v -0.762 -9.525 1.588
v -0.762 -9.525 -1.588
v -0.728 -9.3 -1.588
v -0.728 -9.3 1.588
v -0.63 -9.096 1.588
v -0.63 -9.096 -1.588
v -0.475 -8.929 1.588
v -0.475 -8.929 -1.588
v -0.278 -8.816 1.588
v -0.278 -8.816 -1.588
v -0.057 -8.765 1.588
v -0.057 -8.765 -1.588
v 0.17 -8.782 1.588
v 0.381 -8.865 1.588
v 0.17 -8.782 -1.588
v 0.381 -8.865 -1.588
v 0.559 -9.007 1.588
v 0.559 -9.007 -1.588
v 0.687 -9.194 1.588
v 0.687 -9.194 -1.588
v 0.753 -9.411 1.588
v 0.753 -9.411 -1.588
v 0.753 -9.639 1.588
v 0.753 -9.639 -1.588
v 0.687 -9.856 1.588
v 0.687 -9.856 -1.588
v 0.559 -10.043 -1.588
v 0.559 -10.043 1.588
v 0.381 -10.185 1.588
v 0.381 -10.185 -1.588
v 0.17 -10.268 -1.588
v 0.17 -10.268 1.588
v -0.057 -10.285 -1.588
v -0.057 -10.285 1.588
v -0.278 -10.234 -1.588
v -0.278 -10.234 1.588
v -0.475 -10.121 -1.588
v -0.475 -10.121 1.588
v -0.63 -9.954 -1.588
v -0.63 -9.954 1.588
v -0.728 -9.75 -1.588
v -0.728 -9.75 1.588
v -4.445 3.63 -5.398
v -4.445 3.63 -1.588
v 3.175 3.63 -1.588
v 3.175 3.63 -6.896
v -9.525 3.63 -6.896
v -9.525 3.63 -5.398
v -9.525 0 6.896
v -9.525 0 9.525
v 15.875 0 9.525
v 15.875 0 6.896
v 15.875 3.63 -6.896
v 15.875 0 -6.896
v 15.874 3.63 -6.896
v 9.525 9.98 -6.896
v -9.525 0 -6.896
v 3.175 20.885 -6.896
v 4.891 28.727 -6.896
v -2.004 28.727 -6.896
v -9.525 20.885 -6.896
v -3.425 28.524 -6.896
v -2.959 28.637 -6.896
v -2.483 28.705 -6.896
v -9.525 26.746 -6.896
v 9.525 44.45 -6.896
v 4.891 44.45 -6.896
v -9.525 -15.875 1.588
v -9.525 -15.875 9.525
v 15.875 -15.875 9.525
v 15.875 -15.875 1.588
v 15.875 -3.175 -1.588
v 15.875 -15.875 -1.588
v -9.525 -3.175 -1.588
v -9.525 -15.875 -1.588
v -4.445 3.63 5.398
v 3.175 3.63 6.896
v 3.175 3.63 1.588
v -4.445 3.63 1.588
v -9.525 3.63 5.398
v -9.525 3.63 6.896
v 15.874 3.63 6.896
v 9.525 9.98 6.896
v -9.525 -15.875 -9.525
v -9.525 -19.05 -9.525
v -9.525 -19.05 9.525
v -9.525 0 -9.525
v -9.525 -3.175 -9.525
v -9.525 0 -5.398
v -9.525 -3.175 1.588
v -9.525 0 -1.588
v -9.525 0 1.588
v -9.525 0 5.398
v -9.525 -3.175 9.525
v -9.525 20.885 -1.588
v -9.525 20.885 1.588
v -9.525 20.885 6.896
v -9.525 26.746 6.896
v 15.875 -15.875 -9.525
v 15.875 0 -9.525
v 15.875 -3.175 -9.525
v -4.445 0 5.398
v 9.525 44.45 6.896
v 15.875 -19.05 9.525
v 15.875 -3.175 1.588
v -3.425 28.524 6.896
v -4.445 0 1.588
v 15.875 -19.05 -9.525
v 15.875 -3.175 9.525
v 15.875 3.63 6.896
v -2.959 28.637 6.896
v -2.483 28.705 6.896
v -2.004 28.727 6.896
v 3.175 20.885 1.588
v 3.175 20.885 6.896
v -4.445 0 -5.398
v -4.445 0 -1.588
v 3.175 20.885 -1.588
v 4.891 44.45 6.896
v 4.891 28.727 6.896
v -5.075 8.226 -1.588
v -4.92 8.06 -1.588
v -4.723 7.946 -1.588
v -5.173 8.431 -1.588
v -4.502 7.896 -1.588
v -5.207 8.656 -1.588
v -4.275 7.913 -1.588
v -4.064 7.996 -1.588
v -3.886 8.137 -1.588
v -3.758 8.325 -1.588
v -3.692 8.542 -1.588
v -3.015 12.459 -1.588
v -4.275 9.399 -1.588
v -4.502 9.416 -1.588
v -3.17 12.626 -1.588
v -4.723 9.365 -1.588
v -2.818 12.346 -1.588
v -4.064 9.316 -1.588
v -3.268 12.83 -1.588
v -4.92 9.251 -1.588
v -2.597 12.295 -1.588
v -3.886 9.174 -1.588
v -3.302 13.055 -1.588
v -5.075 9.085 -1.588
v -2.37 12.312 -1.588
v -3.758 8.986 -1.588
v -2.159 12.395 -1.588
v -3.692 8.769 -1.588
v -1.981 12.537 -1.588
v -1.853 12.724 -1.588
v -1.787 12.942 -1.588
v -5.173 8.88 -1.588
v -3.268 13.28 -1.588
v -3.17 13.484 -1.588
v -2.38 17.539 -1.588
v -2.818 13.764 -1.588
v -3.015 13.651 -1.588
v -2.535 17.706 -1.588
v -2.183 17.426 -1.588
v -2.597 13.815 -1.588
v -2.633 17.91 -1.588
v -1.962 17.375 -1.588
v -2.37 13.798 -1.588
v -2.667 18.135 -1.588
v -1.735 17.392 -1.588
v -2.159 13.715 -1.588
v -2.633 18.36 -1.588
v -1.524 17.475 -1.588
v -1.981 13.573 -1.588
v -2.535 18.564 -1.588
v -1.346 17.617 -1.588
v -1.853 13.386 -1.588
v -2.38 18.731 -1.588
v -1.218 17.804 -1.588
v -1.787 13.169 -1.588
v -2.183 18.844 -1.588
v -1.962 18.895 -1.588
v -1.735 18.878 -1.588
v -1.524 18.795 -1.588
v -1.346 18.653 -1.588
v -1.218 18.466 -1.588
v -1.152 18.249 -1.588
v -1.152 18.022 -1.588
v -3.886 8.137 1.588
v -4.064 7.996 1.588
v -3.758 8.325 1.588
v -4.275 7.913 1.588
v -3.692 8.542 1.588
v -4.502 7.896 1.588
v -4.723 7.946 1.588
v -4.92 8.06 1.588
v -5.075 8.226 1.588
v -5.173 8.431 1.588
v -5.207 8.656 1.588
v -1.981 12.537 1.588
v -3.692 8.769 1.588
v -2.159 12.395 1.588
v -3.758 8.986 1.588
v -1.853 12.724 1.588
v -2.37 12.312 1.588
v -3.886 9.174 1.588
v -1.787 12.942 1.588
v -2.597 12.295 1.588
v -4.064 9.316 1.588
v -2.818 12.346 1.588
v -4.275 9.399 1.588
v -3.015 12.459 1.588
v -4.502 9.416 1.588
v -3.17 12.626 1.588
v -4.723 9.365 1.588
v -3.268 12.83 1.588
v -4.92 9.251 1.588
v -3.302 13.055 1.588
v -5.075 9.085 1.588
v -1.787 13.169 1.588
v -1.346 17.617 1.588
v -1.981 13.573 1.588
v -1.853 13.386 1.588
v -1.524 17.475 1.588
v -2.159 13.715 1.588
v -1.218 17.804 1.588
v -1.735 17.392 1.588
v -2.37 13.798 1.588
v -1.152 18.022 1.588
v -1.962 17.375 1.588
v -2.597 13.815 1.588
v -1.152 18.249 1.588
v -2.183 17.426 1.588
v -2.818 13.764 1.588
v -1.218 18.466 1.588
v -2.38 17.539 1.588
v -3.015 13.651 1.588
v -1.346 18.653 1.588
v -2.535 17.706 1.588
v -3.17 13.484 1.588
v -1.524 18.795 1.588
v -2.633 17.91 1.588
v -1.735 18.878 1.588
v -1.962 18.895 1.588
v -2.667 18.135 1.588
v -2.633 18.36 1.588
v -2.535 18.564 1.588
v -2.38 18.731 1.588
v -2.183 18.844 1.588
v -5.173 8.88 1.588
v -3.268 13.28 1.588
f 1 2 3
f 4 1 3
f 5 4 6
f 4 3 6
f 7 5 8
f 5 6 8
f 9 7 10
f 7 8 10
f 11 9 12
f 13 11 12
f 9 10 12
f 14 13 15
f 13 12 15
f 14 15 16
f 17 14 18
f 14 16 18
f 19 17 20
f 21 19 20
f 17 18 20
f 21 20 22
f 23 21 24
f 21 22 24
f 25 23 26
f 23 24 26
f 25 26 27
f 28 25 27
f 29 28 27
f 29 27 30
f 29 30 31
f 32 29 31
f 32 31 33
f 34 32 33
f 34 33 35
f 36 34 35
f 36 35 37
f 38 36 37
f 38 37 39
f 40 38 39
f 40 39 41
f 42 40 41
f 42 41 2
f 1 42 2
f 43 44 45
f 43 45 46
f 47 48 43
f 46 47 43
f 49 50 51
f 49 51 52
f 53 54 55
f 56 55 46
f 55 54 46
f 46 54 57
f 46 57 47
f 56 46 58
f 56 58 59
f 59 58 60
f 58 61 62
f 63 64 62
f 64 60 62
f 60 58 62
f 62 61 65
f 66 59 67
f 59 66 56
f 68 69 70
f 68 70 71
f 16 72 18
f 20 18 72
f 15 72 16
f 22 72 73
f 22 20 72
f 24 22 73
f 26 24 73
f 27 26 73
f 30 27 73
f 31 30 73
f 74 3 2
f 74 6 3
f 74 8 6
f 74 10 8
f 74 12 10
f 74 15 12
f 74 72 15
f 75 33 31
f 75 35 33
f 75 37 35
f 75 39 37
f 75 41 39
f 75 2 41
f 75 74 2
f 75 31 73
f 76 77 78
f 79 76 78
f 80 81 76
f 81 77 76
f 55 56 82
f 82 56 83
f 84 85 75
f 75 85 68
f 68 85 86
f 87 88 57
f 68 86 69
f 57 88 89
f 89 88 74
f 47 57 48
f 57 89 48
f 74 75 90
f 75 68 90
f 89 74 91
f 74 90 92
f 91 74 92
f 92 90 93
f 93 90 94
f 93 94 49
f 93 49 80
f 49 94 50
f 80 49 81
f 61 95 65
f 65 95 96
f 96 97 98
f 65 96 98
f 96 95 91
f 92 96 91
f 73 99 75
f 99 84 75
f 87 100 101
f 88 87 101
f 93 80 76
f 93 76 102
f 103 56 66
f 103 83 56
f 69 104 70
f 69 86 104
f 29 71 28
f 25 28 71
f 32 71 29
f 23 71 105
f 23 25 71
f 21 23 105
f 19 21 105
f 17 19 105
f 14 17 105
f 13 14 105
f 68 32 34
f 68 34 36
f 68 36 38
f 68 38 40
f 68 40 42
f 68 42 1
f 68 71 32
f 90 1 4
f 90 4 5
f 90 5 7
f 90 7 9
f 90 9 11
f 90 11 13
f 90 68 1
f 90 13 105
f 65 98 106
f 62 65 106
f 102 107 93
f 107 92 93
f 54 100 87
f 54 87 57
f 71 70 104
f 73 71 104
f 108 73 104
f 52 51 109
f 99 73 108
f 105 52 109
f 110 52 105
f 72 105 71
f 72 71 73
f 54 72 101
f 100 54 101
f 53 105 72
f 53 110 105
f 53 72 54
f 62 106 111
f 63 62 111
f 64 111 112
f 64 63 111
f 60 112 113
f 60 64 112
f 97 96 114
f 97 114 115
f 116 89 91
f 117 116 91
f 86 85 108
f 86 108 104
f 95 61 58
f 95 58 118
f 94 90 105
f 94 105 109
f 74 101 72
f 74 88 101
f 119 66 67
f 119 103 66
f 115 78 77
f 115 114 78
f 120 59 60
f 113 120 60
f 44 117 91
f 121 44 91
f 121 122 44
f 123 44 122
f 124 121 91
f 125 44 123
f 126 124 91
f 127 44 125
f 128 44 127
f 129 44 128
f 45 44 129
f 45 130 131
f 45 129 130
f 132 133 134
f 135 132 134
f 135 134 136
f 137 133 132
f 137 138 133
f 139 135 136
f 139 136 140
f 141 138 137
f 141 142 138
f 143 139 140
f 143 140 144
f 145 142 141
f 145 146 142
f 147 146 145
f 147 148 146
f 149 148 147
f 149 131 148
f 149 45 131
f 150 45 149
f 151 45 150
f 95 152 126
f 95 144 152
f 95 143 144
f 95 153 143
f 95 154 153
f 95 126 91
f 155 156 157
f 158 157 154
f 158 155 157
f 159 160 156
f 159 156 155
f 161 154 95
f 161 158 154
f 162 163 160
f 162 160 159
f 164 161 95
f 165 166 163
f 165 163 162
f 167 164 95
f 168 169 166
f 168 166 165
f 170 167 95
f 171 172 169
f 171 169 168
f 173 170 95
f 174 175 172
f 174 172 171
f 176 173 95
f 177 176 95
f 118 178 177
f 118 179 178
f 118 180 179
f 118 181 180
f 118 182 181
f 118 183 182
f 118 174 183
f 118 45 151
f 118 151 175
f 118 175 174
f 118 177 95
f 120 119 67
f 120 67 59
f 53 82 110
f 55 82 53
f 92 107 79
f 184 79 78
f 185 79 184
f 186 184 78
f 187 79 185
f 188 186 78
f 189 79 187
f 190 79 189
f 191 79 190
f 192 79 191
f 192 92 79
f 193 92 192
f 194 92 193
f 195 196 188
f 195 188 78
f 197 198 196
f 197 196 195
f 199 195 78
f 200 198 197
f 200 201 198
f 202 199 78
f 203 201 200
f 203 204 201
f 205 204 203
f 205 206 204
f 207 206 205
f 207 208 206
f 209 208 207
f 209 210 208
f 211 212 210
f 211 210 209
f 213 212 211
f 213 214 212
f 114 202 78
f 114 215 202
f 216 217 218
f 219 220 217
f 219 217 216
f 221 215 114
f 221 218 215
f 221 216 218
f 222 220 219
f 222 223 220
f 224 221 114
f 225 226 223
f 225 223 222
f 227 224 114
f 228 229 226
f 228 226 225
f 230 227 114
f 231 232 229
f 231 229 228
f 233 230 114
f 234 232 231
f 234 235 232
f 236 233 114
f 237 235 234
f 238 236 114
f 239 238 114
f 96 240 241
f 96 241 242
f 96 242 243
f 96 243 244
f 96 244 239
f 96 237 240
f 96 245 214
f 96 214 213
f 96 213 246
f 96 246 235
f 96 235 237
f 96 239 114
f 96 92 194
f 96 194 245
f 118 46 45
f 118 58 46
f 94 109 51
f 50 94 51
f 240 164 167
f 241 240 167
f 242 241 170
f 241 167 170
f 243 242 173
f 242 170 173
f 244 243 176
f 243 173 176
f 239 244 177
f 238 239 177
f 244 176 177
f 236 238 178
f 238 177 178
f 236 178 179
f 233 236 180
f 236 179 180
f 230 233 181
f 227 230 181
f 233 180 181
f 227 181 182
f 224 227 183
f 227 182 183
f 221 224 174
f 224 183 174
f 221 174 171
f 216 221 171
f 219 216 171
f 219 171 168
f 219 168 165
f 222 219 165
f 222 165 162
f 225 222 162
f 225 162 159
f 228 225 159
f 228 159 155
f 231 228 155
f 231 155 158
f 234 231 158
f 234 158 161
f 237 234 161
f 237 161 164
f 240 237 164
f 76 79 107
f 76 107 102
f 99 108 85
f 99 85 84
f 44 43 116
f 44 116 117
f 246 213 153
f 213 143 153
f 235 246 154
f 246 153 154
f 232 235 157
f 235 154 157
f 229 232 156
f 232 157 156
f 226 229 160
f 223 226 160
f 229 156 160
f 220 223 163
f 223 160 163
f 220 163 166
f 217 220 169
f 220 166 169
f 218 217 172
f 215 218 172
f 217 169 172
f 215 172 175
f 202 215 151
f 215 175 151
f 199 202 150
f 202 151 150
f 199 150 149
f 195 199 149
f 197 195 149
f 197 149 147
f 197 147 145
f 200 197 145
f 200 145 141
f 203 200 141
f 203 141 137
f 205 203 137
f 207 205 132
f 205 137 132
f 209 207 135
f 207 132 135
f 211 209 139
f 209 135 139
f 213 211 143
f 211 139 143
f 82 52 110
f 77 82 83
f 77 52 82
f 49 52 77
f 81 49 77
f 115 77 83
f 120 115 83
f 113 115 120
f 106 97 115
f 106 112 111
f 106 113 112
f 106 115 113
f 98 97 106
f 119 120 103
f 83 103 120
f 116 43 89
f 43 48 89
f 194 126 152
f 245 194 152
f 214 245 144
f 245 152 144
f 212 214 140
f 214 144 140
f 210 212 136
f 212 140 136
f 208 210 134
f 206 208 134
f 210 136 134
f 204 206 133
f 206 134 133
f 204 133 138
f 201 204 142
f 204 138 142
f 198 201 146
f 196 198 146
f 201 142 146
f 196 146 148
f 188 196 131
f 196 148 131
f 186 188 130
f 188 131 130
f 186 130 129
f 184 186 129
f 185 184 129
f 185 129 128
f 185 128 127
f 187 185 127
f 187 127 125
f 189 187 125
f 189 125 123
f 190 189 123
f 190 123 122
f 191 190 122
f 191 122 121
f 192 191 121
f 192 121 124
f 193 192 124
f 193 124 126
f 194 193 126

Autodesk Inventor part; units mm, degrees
ref_plane "YZ Plane" through (0, 0, 0) normal (1, 0, 0) x (0, 1, 0)
ref_plane "XZ Plane" through (0, 0, 0) normal (0, 1, 0) x (-1, 0, 0)
ref_plane "XY Plane" through (0, 0, 0) normal (0, 0, 1) x (1, 0, 0)
sketch "Sketch1" plane through (0, 0, 0) normal (0, 0, 1) x (1, 0, 0)
  line L0 (-9.525, 0) -> (9.525, 0)
  line L1 (9.525, 0) -> (9.525, 44.45)
  line L2 (9.525, 44.45) -> (5.715, 44.45)
  line L3 (5.715, 44.45) -> (4.891, 28.7274)
  line L4 (4.891, 28.7274) -> (-9.525, 28.7274)
  line L5 (-9.525, 28.7274) -> (-9.525, 0)
  point P0 (0, 0)
  point P1 (0, 0)
  dimension "d0" = 44.45
  dimension "d1" = 15.24
  dimension "d2" = 15.7226
  dimension "d3" = 19.05
  dimension "d14" = 93
extrude "Extrusion1" add sketch "Sketch1" along normal mid plane 15.7226
sketch "Sketch2" plane through (0, 0, 0) normal (1, 0, 0) x (0, 1, 0)
  line L0 (-19.05, 9.525) -> (-19.05, -9.525)
  line L1 (-19.05, -9.525) -> (-15.875, -9.525)
  line L2 (-15.875, -9.525) -> (-15.875, -1.5875)
  line L3 (-15.875, -1.5875) -> (-3.175, -1.5875)
  line L4 (-3.175, -1.5875) -> (-3.175, -9.525)
  line L5 (-3.175, -9.525) -> (0, -9.525)
  line L6 (0, -9.525) -> (0, 9.525)
  line L7 (0, 9.525) -> (-3.175, 9.525)
  line L8 (-3.175, 9.525) -> (-3.175, 1.5875)
  line L9 (-3.175, 1.5875) -> (-15.875, 1.5875)
  line L10 (-15.875, 1.5875) -> (-15.875, 9.525)
  line L11 (-15.875, 9.525) -> (-19.05, 9.525)
  line L12 (0, -7.8613) -> (0, 7.8613) projected
  point P0 (0, 0)
  point P1 (0, 0)
  dimension "d6" = 19.05
  dimension "d7" = 19.05
  dimension "d8" = 3.175
  dimension "d9" = 3.175
extrude "Extrusion2" add sketch "Sketch2" along normal mid plane 19.05
sketch "Sketch6" plane through (0, 0, 7.8613) normal (0, 0, 1) x (1, 0, 0)
  line L0 (4.891, 28.7274) -> (9.525, 28.7274)
  line L1 (9.525, 28.7274) -> (9.525, 44.45)
  line L2 (9.525, 44.45) -> (4.891, 44.45)
  line L3 (4.891, 44.45) -> (4.891, 28.7274)
  point P0 (0, 0)
extrude "Extrusion3" add sketch "Sketch6" against normal blind 15.7226
sketch "Sketch9" plane through (0, 0, 7.8613) normal (0, 0, 1) x (1, 0, 0)
  line L0 (4.891, 44.45) -> (4.891, 28.7274) projected
  line L1 (-9.525, 28.7274) -> (-9.525, 0) projected
  line L2 (4.891, 28.7274) -> (-2.729, 28.7274)
  line L3 (4.891, 28.7274) -> (-9.525, 28.7274) projected
  line L4 (-9.525, 28.7274) -> (-9.525, 26.7462)
  line L5 (-9.525, 26.7462) -> (-2.729, 28.7274)
  point P0 (0, 0)
  dimension "d22" = 14.416
  dimension "d23" = 7.62
  dimension "d24" = 1.9812
extrude "Extrusion5" cut sketch "Sketch9" against normal blind 25.4
fillet "Fillet2" radius 5.08 1 edges at (-2.729, 28.7274, 0)
sketch "Sketch10" plane through (-9.525, -15.875, 1.5875) normal (0, 0, 1) x (1, 0, 0)
  circle A0 centre (9.525, 6.35) radius 0.635
  line L0 (0, 0) -> (0, 12.7) projected
  line L1 (19.05, -3.175) -> (0, -3.175) projected
  point P0 (9.525, 15.875)
  dimension "d28" = 9.525
  dimension "d29" = 9.525
  dimension "d30" = 1.27
extrude "Extrusion6" cut sketch "Sketch10" against normal blind 25.4
sketch "Sketch12" plane through (-9.525, -15.875, -1.5875) normal (-1, 0, 0) x (0, 0, 1)
  line L0 (-6.2738, 60.325) -> (-6.2738, 15.875) projected
  line L1 (9.4488, 42.6212) -> (9.4488, 15.875) projected
  line L2 (-6.2738, 36.7601) -> (9.4488, 36.7601)
  line L3 (9.4488, 36.7601) -> (9.4488, 19.5053)
  line L4 (9.4488, 19.5053) -> (-6.2738, 19.5053)
  line L5 (-6.2738, 19.5053) -> (-6.2738, 36.7601)
  point P0 (1.5875, 15.875)
extrude "Extrusion7" cut sketch "Sketch12" against normal blind 12.7
sketch "Sketch13" plane through (3.175, -15.875, -1.5875) normal (-1, 0, 0) x (0, 0, 1)
  line L0 (0, 12.7) -> (0, 36.7601)
  line L1 (-6.2738, 36.7601) -> (9.4488, 36.7601) projected
  line L2 (0, 12.7) -> (0, 0) projected
  line L3 (3.175, 12.7) -> (3.175, 36.7601)
  line L4 (3.175, 0) -> (3.175, 12.7) projected
  line L5 (9.4488, 19.5053) -> (-6.2738, 19.5053) projected
  line L6 (0, 36.7601) -> (3.175, 36.7601)
  line L7 (3.175, 36.7601) -> (3.175, 19.5053)
  line L8 (3.175, 19.5053) -> (0, 19.5053)
  line L9 (0, 19.5053) -> (0, 36.7601)
  point P0 (1.5875, 15.875)
extrude "Extrusion8" add sketch "Sketch13" along normal blind 12.7
sketch "Sketch15" plane through (3.175, 3.6303, 1.5875) normal (0, 0, 1) x (1, 0, 0)
  circle A0 centre (-7.62, 5.0254) radius 0.635
  line L0 (-12.7, 0) -> (-12.7, 17.2548) projected
  circle A1 centre (-5.715, 9.4248) radius 0.635
  circle A2 centre (-5.08, 14.5048) radius 0.635
  point P0 (-3.175, -3.6303)
  dimension "d40" = 5.08
  dimension "d41" = 1.27
  dimension "d42" = 1.27
  dimension "d45" = 1.27
  dimension "d46" = 6.985
  dimension "d47" = 7.62
extrude "Extrusion9" cut sketch "Sketch15" against normal blind 12.7
sketch "Sketch17" plane through (-9.525, -15.875, -1.5875) normal (-1, 0, 0) x (0, 0, 1)
  line L0 (-7.9375, 15.875) -> (11.1125, 15.875)
  line L1 (0, 19.5053) -> (-3.81, 19.5053)
  line L2 (-3.81, 19.5053) -> (-3.81, 15.875)
  line L3 (-3.81, 15.875) -> (0, 15.875)
  line L4 (0, 15.875) -> (0, 19.5053)
  line L5 (3.175, 19.5053) -> (6.985, 19.5053)
  line L6 (6.985, 19.5053) -> (6.985, 15.875)
  line L7 (6.985, 15.875) -> (3.175, 15.875)
  line L8 (3.175, 15.875) -> (3.175, 19.5053)
  point P0 (1.5875, 15.875)
  dimension "d51" = 3.81
  dimension "d52" = 3.81
extrude "Extrusion10" cut sketch "Sketch17" against normal blind 5.08
sketch "Sketch18" plane through (9.525, 44.45, 7.8613) normal (1, 0, 0) x (0, 0, -1)
  line L0 (-1.6637, -63.5) -> (-1.6637, -60.325)
  line L1 (-1.6637, -60.325) -> (6.2738, -60.325)
  line L2 (6.2738, -60.325) -> (-1.6637, -60.325) projected
  line L3 (6.2738, -60.325) -> (6.2738, -47.625)
  line L4 (6.2738, -47.625) -> (-1.6637, -47.625)
  line L5 (-1.6637, -47.625) -> (-1.6637, -44.45)
  line L6 (-1.6637, -44.45) -> (-1.6637, -47.625) projected
  line L7 (-1.6637, -44.45) -> (0, -44.45)
  line L8 (0, -44.45) -> (0, -40.8197)
  line L9 (0, -44.45) -> (0, 0) projected
  line L10 (15.7226, 0) -> (15.7226, -44.45) projected
  line L11 (15.7226, -41.3057) -> (15.7226, -44.45)
  line L12 (17.3863, -44.45) -> (15.7226, -44.45) projected
  line L13 (15.7226, -44.45) -> (17.3863, -44.45)
  line L14 (17.3863, -44.45) -> (17.3863, -47.625)
  line L15 (17.3863, -47.625) -> (17.3863, -44.45) projected
  line L16 (17.3863, -47.625) -> (9.4488, -47.625)
  line L17 (9.4488, -47.625) -> (9.4488, -60.325)
  line L18 (17.3863, -60.325) -> (9.4488, -60.325) projected
  line L19 (9.4488, -60.325) -> (17.3863, -60.325)
  line L20 (17.3863, -63.5) -> (17.3863, -60.325) projected
  line L21 (17.3863, -60.325) -> (17.3863, -63.5)
  line L22 (17.3863, -63.5) -> (-1.6637, -63.5)
  line L23 (-1.6637, -63.5) -> (17.3863, -63.5) projected
  line L24 (0, -40.8197) -> (15.7226, -40.8197)
  line L25 (9.4488, -40.8197) -> (15.7226, -40.8197) projected
  line L26 (15.7226, -40.8197) -> (15.7226, -44.45)
  point P0 (7.8613, -44.45)
extrude "Extrusion11" add sketch "Sketch18" along normal blind 6.35
chamfer "Chamfer1" distance 6.35 angle 45 1 edges at (9.525, 3.6303, 0)
sketch "Sketch19" plane through (-9.525, -15.875, -1.5875) normal (0, 0, -1) x (-1, 0, 0)
  circle A0 centre (-9.525, 6.35) radius 0.762
  circle A1 centre (-9.525, 6.35) radius 0.635 projected
  point P0 (-9.525, 15.875)
  dimension "d60" = 0
  dimension "d61" = 0
  dimension "d62" = 1.524
extrude "Extrusion12" cut sketch "Sketch19" against normal blind 6.35
sketch "Sketch20" plane through (3.175, 3.6303, -1.5875) normal (0, 0, -1) x (-1, 0, 0)
  circle A0 centre (5.08, 14.5048) radius 0.762
  circle A1 centre (5.08, 14.5048) radius 0.635 projected
  circle A2 centre (5.715, 9.4248) radius 0.762
  circle A3 centre (5.715, 9.4248) radius 0.635 projected
  circle A4 centre (7.62, 5.0254) radius 0.762
  circle A5 centre (7.62, 5.0254) radius 0.635 projected
  point P0 (3.175, -3.6303)
  dimension "d65" = 0
  dimension "d66" = 0
  dimension "d67" = 1.524
  dimension "d68" = 0
  dimension "d69" = 0
  dimension "d70" = 1.524
  dimension "d71" = 0
  dimension "d72" = 0
  dimension "d73" = 1.524
extrude "Extrusion13" cut sketch "Sketch20" against normal blind 6.35
sketch "Sketch25" plane through (-9.525, -15.875, -1.5875) normal (-1, 0, 0) x (0, 0, 1)
  line L0 (9.4488, 19.5053) -> (9.4488, 15.875) projected
  line L1 (-6.2738, 15.875) -> (-6.2738, 19.5053) projected
  line L2 (-6.2738, 15.875) -> (-5.3086, 15.875)
  line L3 (-5.3086, 15.875) -> (-5.3086, 64.7795)
  line L4 (-5.3086, 64.7795) -> (-6.2738, 64.7795)
  line L5 (-6.2738, 64.7795) -> (-6.2738, 15.875)
  line L6 (9.4488, 15.875) -> (8.4836, 15.875)
  line L7 (8.4836, 15.875) -> (8.4836, 64.7795)
  line L8 (8.4836, 64.7795) -> (9.4488, 64.7795)
  line L9 (9.4488, 64.7795) -> (9.4488, 15.875)
  point P0 (1.5875, 15.875)
  dimension "d87" = 15.7226
  dimension "d88" = 0.9652
  dimension "d89" = 0.9652
extrude "Extrusion16" cut sketch "Sketch25" against normal blind 38.1
properties part number "mod_gripper" material "Steel, High Strength Low Alloy"
